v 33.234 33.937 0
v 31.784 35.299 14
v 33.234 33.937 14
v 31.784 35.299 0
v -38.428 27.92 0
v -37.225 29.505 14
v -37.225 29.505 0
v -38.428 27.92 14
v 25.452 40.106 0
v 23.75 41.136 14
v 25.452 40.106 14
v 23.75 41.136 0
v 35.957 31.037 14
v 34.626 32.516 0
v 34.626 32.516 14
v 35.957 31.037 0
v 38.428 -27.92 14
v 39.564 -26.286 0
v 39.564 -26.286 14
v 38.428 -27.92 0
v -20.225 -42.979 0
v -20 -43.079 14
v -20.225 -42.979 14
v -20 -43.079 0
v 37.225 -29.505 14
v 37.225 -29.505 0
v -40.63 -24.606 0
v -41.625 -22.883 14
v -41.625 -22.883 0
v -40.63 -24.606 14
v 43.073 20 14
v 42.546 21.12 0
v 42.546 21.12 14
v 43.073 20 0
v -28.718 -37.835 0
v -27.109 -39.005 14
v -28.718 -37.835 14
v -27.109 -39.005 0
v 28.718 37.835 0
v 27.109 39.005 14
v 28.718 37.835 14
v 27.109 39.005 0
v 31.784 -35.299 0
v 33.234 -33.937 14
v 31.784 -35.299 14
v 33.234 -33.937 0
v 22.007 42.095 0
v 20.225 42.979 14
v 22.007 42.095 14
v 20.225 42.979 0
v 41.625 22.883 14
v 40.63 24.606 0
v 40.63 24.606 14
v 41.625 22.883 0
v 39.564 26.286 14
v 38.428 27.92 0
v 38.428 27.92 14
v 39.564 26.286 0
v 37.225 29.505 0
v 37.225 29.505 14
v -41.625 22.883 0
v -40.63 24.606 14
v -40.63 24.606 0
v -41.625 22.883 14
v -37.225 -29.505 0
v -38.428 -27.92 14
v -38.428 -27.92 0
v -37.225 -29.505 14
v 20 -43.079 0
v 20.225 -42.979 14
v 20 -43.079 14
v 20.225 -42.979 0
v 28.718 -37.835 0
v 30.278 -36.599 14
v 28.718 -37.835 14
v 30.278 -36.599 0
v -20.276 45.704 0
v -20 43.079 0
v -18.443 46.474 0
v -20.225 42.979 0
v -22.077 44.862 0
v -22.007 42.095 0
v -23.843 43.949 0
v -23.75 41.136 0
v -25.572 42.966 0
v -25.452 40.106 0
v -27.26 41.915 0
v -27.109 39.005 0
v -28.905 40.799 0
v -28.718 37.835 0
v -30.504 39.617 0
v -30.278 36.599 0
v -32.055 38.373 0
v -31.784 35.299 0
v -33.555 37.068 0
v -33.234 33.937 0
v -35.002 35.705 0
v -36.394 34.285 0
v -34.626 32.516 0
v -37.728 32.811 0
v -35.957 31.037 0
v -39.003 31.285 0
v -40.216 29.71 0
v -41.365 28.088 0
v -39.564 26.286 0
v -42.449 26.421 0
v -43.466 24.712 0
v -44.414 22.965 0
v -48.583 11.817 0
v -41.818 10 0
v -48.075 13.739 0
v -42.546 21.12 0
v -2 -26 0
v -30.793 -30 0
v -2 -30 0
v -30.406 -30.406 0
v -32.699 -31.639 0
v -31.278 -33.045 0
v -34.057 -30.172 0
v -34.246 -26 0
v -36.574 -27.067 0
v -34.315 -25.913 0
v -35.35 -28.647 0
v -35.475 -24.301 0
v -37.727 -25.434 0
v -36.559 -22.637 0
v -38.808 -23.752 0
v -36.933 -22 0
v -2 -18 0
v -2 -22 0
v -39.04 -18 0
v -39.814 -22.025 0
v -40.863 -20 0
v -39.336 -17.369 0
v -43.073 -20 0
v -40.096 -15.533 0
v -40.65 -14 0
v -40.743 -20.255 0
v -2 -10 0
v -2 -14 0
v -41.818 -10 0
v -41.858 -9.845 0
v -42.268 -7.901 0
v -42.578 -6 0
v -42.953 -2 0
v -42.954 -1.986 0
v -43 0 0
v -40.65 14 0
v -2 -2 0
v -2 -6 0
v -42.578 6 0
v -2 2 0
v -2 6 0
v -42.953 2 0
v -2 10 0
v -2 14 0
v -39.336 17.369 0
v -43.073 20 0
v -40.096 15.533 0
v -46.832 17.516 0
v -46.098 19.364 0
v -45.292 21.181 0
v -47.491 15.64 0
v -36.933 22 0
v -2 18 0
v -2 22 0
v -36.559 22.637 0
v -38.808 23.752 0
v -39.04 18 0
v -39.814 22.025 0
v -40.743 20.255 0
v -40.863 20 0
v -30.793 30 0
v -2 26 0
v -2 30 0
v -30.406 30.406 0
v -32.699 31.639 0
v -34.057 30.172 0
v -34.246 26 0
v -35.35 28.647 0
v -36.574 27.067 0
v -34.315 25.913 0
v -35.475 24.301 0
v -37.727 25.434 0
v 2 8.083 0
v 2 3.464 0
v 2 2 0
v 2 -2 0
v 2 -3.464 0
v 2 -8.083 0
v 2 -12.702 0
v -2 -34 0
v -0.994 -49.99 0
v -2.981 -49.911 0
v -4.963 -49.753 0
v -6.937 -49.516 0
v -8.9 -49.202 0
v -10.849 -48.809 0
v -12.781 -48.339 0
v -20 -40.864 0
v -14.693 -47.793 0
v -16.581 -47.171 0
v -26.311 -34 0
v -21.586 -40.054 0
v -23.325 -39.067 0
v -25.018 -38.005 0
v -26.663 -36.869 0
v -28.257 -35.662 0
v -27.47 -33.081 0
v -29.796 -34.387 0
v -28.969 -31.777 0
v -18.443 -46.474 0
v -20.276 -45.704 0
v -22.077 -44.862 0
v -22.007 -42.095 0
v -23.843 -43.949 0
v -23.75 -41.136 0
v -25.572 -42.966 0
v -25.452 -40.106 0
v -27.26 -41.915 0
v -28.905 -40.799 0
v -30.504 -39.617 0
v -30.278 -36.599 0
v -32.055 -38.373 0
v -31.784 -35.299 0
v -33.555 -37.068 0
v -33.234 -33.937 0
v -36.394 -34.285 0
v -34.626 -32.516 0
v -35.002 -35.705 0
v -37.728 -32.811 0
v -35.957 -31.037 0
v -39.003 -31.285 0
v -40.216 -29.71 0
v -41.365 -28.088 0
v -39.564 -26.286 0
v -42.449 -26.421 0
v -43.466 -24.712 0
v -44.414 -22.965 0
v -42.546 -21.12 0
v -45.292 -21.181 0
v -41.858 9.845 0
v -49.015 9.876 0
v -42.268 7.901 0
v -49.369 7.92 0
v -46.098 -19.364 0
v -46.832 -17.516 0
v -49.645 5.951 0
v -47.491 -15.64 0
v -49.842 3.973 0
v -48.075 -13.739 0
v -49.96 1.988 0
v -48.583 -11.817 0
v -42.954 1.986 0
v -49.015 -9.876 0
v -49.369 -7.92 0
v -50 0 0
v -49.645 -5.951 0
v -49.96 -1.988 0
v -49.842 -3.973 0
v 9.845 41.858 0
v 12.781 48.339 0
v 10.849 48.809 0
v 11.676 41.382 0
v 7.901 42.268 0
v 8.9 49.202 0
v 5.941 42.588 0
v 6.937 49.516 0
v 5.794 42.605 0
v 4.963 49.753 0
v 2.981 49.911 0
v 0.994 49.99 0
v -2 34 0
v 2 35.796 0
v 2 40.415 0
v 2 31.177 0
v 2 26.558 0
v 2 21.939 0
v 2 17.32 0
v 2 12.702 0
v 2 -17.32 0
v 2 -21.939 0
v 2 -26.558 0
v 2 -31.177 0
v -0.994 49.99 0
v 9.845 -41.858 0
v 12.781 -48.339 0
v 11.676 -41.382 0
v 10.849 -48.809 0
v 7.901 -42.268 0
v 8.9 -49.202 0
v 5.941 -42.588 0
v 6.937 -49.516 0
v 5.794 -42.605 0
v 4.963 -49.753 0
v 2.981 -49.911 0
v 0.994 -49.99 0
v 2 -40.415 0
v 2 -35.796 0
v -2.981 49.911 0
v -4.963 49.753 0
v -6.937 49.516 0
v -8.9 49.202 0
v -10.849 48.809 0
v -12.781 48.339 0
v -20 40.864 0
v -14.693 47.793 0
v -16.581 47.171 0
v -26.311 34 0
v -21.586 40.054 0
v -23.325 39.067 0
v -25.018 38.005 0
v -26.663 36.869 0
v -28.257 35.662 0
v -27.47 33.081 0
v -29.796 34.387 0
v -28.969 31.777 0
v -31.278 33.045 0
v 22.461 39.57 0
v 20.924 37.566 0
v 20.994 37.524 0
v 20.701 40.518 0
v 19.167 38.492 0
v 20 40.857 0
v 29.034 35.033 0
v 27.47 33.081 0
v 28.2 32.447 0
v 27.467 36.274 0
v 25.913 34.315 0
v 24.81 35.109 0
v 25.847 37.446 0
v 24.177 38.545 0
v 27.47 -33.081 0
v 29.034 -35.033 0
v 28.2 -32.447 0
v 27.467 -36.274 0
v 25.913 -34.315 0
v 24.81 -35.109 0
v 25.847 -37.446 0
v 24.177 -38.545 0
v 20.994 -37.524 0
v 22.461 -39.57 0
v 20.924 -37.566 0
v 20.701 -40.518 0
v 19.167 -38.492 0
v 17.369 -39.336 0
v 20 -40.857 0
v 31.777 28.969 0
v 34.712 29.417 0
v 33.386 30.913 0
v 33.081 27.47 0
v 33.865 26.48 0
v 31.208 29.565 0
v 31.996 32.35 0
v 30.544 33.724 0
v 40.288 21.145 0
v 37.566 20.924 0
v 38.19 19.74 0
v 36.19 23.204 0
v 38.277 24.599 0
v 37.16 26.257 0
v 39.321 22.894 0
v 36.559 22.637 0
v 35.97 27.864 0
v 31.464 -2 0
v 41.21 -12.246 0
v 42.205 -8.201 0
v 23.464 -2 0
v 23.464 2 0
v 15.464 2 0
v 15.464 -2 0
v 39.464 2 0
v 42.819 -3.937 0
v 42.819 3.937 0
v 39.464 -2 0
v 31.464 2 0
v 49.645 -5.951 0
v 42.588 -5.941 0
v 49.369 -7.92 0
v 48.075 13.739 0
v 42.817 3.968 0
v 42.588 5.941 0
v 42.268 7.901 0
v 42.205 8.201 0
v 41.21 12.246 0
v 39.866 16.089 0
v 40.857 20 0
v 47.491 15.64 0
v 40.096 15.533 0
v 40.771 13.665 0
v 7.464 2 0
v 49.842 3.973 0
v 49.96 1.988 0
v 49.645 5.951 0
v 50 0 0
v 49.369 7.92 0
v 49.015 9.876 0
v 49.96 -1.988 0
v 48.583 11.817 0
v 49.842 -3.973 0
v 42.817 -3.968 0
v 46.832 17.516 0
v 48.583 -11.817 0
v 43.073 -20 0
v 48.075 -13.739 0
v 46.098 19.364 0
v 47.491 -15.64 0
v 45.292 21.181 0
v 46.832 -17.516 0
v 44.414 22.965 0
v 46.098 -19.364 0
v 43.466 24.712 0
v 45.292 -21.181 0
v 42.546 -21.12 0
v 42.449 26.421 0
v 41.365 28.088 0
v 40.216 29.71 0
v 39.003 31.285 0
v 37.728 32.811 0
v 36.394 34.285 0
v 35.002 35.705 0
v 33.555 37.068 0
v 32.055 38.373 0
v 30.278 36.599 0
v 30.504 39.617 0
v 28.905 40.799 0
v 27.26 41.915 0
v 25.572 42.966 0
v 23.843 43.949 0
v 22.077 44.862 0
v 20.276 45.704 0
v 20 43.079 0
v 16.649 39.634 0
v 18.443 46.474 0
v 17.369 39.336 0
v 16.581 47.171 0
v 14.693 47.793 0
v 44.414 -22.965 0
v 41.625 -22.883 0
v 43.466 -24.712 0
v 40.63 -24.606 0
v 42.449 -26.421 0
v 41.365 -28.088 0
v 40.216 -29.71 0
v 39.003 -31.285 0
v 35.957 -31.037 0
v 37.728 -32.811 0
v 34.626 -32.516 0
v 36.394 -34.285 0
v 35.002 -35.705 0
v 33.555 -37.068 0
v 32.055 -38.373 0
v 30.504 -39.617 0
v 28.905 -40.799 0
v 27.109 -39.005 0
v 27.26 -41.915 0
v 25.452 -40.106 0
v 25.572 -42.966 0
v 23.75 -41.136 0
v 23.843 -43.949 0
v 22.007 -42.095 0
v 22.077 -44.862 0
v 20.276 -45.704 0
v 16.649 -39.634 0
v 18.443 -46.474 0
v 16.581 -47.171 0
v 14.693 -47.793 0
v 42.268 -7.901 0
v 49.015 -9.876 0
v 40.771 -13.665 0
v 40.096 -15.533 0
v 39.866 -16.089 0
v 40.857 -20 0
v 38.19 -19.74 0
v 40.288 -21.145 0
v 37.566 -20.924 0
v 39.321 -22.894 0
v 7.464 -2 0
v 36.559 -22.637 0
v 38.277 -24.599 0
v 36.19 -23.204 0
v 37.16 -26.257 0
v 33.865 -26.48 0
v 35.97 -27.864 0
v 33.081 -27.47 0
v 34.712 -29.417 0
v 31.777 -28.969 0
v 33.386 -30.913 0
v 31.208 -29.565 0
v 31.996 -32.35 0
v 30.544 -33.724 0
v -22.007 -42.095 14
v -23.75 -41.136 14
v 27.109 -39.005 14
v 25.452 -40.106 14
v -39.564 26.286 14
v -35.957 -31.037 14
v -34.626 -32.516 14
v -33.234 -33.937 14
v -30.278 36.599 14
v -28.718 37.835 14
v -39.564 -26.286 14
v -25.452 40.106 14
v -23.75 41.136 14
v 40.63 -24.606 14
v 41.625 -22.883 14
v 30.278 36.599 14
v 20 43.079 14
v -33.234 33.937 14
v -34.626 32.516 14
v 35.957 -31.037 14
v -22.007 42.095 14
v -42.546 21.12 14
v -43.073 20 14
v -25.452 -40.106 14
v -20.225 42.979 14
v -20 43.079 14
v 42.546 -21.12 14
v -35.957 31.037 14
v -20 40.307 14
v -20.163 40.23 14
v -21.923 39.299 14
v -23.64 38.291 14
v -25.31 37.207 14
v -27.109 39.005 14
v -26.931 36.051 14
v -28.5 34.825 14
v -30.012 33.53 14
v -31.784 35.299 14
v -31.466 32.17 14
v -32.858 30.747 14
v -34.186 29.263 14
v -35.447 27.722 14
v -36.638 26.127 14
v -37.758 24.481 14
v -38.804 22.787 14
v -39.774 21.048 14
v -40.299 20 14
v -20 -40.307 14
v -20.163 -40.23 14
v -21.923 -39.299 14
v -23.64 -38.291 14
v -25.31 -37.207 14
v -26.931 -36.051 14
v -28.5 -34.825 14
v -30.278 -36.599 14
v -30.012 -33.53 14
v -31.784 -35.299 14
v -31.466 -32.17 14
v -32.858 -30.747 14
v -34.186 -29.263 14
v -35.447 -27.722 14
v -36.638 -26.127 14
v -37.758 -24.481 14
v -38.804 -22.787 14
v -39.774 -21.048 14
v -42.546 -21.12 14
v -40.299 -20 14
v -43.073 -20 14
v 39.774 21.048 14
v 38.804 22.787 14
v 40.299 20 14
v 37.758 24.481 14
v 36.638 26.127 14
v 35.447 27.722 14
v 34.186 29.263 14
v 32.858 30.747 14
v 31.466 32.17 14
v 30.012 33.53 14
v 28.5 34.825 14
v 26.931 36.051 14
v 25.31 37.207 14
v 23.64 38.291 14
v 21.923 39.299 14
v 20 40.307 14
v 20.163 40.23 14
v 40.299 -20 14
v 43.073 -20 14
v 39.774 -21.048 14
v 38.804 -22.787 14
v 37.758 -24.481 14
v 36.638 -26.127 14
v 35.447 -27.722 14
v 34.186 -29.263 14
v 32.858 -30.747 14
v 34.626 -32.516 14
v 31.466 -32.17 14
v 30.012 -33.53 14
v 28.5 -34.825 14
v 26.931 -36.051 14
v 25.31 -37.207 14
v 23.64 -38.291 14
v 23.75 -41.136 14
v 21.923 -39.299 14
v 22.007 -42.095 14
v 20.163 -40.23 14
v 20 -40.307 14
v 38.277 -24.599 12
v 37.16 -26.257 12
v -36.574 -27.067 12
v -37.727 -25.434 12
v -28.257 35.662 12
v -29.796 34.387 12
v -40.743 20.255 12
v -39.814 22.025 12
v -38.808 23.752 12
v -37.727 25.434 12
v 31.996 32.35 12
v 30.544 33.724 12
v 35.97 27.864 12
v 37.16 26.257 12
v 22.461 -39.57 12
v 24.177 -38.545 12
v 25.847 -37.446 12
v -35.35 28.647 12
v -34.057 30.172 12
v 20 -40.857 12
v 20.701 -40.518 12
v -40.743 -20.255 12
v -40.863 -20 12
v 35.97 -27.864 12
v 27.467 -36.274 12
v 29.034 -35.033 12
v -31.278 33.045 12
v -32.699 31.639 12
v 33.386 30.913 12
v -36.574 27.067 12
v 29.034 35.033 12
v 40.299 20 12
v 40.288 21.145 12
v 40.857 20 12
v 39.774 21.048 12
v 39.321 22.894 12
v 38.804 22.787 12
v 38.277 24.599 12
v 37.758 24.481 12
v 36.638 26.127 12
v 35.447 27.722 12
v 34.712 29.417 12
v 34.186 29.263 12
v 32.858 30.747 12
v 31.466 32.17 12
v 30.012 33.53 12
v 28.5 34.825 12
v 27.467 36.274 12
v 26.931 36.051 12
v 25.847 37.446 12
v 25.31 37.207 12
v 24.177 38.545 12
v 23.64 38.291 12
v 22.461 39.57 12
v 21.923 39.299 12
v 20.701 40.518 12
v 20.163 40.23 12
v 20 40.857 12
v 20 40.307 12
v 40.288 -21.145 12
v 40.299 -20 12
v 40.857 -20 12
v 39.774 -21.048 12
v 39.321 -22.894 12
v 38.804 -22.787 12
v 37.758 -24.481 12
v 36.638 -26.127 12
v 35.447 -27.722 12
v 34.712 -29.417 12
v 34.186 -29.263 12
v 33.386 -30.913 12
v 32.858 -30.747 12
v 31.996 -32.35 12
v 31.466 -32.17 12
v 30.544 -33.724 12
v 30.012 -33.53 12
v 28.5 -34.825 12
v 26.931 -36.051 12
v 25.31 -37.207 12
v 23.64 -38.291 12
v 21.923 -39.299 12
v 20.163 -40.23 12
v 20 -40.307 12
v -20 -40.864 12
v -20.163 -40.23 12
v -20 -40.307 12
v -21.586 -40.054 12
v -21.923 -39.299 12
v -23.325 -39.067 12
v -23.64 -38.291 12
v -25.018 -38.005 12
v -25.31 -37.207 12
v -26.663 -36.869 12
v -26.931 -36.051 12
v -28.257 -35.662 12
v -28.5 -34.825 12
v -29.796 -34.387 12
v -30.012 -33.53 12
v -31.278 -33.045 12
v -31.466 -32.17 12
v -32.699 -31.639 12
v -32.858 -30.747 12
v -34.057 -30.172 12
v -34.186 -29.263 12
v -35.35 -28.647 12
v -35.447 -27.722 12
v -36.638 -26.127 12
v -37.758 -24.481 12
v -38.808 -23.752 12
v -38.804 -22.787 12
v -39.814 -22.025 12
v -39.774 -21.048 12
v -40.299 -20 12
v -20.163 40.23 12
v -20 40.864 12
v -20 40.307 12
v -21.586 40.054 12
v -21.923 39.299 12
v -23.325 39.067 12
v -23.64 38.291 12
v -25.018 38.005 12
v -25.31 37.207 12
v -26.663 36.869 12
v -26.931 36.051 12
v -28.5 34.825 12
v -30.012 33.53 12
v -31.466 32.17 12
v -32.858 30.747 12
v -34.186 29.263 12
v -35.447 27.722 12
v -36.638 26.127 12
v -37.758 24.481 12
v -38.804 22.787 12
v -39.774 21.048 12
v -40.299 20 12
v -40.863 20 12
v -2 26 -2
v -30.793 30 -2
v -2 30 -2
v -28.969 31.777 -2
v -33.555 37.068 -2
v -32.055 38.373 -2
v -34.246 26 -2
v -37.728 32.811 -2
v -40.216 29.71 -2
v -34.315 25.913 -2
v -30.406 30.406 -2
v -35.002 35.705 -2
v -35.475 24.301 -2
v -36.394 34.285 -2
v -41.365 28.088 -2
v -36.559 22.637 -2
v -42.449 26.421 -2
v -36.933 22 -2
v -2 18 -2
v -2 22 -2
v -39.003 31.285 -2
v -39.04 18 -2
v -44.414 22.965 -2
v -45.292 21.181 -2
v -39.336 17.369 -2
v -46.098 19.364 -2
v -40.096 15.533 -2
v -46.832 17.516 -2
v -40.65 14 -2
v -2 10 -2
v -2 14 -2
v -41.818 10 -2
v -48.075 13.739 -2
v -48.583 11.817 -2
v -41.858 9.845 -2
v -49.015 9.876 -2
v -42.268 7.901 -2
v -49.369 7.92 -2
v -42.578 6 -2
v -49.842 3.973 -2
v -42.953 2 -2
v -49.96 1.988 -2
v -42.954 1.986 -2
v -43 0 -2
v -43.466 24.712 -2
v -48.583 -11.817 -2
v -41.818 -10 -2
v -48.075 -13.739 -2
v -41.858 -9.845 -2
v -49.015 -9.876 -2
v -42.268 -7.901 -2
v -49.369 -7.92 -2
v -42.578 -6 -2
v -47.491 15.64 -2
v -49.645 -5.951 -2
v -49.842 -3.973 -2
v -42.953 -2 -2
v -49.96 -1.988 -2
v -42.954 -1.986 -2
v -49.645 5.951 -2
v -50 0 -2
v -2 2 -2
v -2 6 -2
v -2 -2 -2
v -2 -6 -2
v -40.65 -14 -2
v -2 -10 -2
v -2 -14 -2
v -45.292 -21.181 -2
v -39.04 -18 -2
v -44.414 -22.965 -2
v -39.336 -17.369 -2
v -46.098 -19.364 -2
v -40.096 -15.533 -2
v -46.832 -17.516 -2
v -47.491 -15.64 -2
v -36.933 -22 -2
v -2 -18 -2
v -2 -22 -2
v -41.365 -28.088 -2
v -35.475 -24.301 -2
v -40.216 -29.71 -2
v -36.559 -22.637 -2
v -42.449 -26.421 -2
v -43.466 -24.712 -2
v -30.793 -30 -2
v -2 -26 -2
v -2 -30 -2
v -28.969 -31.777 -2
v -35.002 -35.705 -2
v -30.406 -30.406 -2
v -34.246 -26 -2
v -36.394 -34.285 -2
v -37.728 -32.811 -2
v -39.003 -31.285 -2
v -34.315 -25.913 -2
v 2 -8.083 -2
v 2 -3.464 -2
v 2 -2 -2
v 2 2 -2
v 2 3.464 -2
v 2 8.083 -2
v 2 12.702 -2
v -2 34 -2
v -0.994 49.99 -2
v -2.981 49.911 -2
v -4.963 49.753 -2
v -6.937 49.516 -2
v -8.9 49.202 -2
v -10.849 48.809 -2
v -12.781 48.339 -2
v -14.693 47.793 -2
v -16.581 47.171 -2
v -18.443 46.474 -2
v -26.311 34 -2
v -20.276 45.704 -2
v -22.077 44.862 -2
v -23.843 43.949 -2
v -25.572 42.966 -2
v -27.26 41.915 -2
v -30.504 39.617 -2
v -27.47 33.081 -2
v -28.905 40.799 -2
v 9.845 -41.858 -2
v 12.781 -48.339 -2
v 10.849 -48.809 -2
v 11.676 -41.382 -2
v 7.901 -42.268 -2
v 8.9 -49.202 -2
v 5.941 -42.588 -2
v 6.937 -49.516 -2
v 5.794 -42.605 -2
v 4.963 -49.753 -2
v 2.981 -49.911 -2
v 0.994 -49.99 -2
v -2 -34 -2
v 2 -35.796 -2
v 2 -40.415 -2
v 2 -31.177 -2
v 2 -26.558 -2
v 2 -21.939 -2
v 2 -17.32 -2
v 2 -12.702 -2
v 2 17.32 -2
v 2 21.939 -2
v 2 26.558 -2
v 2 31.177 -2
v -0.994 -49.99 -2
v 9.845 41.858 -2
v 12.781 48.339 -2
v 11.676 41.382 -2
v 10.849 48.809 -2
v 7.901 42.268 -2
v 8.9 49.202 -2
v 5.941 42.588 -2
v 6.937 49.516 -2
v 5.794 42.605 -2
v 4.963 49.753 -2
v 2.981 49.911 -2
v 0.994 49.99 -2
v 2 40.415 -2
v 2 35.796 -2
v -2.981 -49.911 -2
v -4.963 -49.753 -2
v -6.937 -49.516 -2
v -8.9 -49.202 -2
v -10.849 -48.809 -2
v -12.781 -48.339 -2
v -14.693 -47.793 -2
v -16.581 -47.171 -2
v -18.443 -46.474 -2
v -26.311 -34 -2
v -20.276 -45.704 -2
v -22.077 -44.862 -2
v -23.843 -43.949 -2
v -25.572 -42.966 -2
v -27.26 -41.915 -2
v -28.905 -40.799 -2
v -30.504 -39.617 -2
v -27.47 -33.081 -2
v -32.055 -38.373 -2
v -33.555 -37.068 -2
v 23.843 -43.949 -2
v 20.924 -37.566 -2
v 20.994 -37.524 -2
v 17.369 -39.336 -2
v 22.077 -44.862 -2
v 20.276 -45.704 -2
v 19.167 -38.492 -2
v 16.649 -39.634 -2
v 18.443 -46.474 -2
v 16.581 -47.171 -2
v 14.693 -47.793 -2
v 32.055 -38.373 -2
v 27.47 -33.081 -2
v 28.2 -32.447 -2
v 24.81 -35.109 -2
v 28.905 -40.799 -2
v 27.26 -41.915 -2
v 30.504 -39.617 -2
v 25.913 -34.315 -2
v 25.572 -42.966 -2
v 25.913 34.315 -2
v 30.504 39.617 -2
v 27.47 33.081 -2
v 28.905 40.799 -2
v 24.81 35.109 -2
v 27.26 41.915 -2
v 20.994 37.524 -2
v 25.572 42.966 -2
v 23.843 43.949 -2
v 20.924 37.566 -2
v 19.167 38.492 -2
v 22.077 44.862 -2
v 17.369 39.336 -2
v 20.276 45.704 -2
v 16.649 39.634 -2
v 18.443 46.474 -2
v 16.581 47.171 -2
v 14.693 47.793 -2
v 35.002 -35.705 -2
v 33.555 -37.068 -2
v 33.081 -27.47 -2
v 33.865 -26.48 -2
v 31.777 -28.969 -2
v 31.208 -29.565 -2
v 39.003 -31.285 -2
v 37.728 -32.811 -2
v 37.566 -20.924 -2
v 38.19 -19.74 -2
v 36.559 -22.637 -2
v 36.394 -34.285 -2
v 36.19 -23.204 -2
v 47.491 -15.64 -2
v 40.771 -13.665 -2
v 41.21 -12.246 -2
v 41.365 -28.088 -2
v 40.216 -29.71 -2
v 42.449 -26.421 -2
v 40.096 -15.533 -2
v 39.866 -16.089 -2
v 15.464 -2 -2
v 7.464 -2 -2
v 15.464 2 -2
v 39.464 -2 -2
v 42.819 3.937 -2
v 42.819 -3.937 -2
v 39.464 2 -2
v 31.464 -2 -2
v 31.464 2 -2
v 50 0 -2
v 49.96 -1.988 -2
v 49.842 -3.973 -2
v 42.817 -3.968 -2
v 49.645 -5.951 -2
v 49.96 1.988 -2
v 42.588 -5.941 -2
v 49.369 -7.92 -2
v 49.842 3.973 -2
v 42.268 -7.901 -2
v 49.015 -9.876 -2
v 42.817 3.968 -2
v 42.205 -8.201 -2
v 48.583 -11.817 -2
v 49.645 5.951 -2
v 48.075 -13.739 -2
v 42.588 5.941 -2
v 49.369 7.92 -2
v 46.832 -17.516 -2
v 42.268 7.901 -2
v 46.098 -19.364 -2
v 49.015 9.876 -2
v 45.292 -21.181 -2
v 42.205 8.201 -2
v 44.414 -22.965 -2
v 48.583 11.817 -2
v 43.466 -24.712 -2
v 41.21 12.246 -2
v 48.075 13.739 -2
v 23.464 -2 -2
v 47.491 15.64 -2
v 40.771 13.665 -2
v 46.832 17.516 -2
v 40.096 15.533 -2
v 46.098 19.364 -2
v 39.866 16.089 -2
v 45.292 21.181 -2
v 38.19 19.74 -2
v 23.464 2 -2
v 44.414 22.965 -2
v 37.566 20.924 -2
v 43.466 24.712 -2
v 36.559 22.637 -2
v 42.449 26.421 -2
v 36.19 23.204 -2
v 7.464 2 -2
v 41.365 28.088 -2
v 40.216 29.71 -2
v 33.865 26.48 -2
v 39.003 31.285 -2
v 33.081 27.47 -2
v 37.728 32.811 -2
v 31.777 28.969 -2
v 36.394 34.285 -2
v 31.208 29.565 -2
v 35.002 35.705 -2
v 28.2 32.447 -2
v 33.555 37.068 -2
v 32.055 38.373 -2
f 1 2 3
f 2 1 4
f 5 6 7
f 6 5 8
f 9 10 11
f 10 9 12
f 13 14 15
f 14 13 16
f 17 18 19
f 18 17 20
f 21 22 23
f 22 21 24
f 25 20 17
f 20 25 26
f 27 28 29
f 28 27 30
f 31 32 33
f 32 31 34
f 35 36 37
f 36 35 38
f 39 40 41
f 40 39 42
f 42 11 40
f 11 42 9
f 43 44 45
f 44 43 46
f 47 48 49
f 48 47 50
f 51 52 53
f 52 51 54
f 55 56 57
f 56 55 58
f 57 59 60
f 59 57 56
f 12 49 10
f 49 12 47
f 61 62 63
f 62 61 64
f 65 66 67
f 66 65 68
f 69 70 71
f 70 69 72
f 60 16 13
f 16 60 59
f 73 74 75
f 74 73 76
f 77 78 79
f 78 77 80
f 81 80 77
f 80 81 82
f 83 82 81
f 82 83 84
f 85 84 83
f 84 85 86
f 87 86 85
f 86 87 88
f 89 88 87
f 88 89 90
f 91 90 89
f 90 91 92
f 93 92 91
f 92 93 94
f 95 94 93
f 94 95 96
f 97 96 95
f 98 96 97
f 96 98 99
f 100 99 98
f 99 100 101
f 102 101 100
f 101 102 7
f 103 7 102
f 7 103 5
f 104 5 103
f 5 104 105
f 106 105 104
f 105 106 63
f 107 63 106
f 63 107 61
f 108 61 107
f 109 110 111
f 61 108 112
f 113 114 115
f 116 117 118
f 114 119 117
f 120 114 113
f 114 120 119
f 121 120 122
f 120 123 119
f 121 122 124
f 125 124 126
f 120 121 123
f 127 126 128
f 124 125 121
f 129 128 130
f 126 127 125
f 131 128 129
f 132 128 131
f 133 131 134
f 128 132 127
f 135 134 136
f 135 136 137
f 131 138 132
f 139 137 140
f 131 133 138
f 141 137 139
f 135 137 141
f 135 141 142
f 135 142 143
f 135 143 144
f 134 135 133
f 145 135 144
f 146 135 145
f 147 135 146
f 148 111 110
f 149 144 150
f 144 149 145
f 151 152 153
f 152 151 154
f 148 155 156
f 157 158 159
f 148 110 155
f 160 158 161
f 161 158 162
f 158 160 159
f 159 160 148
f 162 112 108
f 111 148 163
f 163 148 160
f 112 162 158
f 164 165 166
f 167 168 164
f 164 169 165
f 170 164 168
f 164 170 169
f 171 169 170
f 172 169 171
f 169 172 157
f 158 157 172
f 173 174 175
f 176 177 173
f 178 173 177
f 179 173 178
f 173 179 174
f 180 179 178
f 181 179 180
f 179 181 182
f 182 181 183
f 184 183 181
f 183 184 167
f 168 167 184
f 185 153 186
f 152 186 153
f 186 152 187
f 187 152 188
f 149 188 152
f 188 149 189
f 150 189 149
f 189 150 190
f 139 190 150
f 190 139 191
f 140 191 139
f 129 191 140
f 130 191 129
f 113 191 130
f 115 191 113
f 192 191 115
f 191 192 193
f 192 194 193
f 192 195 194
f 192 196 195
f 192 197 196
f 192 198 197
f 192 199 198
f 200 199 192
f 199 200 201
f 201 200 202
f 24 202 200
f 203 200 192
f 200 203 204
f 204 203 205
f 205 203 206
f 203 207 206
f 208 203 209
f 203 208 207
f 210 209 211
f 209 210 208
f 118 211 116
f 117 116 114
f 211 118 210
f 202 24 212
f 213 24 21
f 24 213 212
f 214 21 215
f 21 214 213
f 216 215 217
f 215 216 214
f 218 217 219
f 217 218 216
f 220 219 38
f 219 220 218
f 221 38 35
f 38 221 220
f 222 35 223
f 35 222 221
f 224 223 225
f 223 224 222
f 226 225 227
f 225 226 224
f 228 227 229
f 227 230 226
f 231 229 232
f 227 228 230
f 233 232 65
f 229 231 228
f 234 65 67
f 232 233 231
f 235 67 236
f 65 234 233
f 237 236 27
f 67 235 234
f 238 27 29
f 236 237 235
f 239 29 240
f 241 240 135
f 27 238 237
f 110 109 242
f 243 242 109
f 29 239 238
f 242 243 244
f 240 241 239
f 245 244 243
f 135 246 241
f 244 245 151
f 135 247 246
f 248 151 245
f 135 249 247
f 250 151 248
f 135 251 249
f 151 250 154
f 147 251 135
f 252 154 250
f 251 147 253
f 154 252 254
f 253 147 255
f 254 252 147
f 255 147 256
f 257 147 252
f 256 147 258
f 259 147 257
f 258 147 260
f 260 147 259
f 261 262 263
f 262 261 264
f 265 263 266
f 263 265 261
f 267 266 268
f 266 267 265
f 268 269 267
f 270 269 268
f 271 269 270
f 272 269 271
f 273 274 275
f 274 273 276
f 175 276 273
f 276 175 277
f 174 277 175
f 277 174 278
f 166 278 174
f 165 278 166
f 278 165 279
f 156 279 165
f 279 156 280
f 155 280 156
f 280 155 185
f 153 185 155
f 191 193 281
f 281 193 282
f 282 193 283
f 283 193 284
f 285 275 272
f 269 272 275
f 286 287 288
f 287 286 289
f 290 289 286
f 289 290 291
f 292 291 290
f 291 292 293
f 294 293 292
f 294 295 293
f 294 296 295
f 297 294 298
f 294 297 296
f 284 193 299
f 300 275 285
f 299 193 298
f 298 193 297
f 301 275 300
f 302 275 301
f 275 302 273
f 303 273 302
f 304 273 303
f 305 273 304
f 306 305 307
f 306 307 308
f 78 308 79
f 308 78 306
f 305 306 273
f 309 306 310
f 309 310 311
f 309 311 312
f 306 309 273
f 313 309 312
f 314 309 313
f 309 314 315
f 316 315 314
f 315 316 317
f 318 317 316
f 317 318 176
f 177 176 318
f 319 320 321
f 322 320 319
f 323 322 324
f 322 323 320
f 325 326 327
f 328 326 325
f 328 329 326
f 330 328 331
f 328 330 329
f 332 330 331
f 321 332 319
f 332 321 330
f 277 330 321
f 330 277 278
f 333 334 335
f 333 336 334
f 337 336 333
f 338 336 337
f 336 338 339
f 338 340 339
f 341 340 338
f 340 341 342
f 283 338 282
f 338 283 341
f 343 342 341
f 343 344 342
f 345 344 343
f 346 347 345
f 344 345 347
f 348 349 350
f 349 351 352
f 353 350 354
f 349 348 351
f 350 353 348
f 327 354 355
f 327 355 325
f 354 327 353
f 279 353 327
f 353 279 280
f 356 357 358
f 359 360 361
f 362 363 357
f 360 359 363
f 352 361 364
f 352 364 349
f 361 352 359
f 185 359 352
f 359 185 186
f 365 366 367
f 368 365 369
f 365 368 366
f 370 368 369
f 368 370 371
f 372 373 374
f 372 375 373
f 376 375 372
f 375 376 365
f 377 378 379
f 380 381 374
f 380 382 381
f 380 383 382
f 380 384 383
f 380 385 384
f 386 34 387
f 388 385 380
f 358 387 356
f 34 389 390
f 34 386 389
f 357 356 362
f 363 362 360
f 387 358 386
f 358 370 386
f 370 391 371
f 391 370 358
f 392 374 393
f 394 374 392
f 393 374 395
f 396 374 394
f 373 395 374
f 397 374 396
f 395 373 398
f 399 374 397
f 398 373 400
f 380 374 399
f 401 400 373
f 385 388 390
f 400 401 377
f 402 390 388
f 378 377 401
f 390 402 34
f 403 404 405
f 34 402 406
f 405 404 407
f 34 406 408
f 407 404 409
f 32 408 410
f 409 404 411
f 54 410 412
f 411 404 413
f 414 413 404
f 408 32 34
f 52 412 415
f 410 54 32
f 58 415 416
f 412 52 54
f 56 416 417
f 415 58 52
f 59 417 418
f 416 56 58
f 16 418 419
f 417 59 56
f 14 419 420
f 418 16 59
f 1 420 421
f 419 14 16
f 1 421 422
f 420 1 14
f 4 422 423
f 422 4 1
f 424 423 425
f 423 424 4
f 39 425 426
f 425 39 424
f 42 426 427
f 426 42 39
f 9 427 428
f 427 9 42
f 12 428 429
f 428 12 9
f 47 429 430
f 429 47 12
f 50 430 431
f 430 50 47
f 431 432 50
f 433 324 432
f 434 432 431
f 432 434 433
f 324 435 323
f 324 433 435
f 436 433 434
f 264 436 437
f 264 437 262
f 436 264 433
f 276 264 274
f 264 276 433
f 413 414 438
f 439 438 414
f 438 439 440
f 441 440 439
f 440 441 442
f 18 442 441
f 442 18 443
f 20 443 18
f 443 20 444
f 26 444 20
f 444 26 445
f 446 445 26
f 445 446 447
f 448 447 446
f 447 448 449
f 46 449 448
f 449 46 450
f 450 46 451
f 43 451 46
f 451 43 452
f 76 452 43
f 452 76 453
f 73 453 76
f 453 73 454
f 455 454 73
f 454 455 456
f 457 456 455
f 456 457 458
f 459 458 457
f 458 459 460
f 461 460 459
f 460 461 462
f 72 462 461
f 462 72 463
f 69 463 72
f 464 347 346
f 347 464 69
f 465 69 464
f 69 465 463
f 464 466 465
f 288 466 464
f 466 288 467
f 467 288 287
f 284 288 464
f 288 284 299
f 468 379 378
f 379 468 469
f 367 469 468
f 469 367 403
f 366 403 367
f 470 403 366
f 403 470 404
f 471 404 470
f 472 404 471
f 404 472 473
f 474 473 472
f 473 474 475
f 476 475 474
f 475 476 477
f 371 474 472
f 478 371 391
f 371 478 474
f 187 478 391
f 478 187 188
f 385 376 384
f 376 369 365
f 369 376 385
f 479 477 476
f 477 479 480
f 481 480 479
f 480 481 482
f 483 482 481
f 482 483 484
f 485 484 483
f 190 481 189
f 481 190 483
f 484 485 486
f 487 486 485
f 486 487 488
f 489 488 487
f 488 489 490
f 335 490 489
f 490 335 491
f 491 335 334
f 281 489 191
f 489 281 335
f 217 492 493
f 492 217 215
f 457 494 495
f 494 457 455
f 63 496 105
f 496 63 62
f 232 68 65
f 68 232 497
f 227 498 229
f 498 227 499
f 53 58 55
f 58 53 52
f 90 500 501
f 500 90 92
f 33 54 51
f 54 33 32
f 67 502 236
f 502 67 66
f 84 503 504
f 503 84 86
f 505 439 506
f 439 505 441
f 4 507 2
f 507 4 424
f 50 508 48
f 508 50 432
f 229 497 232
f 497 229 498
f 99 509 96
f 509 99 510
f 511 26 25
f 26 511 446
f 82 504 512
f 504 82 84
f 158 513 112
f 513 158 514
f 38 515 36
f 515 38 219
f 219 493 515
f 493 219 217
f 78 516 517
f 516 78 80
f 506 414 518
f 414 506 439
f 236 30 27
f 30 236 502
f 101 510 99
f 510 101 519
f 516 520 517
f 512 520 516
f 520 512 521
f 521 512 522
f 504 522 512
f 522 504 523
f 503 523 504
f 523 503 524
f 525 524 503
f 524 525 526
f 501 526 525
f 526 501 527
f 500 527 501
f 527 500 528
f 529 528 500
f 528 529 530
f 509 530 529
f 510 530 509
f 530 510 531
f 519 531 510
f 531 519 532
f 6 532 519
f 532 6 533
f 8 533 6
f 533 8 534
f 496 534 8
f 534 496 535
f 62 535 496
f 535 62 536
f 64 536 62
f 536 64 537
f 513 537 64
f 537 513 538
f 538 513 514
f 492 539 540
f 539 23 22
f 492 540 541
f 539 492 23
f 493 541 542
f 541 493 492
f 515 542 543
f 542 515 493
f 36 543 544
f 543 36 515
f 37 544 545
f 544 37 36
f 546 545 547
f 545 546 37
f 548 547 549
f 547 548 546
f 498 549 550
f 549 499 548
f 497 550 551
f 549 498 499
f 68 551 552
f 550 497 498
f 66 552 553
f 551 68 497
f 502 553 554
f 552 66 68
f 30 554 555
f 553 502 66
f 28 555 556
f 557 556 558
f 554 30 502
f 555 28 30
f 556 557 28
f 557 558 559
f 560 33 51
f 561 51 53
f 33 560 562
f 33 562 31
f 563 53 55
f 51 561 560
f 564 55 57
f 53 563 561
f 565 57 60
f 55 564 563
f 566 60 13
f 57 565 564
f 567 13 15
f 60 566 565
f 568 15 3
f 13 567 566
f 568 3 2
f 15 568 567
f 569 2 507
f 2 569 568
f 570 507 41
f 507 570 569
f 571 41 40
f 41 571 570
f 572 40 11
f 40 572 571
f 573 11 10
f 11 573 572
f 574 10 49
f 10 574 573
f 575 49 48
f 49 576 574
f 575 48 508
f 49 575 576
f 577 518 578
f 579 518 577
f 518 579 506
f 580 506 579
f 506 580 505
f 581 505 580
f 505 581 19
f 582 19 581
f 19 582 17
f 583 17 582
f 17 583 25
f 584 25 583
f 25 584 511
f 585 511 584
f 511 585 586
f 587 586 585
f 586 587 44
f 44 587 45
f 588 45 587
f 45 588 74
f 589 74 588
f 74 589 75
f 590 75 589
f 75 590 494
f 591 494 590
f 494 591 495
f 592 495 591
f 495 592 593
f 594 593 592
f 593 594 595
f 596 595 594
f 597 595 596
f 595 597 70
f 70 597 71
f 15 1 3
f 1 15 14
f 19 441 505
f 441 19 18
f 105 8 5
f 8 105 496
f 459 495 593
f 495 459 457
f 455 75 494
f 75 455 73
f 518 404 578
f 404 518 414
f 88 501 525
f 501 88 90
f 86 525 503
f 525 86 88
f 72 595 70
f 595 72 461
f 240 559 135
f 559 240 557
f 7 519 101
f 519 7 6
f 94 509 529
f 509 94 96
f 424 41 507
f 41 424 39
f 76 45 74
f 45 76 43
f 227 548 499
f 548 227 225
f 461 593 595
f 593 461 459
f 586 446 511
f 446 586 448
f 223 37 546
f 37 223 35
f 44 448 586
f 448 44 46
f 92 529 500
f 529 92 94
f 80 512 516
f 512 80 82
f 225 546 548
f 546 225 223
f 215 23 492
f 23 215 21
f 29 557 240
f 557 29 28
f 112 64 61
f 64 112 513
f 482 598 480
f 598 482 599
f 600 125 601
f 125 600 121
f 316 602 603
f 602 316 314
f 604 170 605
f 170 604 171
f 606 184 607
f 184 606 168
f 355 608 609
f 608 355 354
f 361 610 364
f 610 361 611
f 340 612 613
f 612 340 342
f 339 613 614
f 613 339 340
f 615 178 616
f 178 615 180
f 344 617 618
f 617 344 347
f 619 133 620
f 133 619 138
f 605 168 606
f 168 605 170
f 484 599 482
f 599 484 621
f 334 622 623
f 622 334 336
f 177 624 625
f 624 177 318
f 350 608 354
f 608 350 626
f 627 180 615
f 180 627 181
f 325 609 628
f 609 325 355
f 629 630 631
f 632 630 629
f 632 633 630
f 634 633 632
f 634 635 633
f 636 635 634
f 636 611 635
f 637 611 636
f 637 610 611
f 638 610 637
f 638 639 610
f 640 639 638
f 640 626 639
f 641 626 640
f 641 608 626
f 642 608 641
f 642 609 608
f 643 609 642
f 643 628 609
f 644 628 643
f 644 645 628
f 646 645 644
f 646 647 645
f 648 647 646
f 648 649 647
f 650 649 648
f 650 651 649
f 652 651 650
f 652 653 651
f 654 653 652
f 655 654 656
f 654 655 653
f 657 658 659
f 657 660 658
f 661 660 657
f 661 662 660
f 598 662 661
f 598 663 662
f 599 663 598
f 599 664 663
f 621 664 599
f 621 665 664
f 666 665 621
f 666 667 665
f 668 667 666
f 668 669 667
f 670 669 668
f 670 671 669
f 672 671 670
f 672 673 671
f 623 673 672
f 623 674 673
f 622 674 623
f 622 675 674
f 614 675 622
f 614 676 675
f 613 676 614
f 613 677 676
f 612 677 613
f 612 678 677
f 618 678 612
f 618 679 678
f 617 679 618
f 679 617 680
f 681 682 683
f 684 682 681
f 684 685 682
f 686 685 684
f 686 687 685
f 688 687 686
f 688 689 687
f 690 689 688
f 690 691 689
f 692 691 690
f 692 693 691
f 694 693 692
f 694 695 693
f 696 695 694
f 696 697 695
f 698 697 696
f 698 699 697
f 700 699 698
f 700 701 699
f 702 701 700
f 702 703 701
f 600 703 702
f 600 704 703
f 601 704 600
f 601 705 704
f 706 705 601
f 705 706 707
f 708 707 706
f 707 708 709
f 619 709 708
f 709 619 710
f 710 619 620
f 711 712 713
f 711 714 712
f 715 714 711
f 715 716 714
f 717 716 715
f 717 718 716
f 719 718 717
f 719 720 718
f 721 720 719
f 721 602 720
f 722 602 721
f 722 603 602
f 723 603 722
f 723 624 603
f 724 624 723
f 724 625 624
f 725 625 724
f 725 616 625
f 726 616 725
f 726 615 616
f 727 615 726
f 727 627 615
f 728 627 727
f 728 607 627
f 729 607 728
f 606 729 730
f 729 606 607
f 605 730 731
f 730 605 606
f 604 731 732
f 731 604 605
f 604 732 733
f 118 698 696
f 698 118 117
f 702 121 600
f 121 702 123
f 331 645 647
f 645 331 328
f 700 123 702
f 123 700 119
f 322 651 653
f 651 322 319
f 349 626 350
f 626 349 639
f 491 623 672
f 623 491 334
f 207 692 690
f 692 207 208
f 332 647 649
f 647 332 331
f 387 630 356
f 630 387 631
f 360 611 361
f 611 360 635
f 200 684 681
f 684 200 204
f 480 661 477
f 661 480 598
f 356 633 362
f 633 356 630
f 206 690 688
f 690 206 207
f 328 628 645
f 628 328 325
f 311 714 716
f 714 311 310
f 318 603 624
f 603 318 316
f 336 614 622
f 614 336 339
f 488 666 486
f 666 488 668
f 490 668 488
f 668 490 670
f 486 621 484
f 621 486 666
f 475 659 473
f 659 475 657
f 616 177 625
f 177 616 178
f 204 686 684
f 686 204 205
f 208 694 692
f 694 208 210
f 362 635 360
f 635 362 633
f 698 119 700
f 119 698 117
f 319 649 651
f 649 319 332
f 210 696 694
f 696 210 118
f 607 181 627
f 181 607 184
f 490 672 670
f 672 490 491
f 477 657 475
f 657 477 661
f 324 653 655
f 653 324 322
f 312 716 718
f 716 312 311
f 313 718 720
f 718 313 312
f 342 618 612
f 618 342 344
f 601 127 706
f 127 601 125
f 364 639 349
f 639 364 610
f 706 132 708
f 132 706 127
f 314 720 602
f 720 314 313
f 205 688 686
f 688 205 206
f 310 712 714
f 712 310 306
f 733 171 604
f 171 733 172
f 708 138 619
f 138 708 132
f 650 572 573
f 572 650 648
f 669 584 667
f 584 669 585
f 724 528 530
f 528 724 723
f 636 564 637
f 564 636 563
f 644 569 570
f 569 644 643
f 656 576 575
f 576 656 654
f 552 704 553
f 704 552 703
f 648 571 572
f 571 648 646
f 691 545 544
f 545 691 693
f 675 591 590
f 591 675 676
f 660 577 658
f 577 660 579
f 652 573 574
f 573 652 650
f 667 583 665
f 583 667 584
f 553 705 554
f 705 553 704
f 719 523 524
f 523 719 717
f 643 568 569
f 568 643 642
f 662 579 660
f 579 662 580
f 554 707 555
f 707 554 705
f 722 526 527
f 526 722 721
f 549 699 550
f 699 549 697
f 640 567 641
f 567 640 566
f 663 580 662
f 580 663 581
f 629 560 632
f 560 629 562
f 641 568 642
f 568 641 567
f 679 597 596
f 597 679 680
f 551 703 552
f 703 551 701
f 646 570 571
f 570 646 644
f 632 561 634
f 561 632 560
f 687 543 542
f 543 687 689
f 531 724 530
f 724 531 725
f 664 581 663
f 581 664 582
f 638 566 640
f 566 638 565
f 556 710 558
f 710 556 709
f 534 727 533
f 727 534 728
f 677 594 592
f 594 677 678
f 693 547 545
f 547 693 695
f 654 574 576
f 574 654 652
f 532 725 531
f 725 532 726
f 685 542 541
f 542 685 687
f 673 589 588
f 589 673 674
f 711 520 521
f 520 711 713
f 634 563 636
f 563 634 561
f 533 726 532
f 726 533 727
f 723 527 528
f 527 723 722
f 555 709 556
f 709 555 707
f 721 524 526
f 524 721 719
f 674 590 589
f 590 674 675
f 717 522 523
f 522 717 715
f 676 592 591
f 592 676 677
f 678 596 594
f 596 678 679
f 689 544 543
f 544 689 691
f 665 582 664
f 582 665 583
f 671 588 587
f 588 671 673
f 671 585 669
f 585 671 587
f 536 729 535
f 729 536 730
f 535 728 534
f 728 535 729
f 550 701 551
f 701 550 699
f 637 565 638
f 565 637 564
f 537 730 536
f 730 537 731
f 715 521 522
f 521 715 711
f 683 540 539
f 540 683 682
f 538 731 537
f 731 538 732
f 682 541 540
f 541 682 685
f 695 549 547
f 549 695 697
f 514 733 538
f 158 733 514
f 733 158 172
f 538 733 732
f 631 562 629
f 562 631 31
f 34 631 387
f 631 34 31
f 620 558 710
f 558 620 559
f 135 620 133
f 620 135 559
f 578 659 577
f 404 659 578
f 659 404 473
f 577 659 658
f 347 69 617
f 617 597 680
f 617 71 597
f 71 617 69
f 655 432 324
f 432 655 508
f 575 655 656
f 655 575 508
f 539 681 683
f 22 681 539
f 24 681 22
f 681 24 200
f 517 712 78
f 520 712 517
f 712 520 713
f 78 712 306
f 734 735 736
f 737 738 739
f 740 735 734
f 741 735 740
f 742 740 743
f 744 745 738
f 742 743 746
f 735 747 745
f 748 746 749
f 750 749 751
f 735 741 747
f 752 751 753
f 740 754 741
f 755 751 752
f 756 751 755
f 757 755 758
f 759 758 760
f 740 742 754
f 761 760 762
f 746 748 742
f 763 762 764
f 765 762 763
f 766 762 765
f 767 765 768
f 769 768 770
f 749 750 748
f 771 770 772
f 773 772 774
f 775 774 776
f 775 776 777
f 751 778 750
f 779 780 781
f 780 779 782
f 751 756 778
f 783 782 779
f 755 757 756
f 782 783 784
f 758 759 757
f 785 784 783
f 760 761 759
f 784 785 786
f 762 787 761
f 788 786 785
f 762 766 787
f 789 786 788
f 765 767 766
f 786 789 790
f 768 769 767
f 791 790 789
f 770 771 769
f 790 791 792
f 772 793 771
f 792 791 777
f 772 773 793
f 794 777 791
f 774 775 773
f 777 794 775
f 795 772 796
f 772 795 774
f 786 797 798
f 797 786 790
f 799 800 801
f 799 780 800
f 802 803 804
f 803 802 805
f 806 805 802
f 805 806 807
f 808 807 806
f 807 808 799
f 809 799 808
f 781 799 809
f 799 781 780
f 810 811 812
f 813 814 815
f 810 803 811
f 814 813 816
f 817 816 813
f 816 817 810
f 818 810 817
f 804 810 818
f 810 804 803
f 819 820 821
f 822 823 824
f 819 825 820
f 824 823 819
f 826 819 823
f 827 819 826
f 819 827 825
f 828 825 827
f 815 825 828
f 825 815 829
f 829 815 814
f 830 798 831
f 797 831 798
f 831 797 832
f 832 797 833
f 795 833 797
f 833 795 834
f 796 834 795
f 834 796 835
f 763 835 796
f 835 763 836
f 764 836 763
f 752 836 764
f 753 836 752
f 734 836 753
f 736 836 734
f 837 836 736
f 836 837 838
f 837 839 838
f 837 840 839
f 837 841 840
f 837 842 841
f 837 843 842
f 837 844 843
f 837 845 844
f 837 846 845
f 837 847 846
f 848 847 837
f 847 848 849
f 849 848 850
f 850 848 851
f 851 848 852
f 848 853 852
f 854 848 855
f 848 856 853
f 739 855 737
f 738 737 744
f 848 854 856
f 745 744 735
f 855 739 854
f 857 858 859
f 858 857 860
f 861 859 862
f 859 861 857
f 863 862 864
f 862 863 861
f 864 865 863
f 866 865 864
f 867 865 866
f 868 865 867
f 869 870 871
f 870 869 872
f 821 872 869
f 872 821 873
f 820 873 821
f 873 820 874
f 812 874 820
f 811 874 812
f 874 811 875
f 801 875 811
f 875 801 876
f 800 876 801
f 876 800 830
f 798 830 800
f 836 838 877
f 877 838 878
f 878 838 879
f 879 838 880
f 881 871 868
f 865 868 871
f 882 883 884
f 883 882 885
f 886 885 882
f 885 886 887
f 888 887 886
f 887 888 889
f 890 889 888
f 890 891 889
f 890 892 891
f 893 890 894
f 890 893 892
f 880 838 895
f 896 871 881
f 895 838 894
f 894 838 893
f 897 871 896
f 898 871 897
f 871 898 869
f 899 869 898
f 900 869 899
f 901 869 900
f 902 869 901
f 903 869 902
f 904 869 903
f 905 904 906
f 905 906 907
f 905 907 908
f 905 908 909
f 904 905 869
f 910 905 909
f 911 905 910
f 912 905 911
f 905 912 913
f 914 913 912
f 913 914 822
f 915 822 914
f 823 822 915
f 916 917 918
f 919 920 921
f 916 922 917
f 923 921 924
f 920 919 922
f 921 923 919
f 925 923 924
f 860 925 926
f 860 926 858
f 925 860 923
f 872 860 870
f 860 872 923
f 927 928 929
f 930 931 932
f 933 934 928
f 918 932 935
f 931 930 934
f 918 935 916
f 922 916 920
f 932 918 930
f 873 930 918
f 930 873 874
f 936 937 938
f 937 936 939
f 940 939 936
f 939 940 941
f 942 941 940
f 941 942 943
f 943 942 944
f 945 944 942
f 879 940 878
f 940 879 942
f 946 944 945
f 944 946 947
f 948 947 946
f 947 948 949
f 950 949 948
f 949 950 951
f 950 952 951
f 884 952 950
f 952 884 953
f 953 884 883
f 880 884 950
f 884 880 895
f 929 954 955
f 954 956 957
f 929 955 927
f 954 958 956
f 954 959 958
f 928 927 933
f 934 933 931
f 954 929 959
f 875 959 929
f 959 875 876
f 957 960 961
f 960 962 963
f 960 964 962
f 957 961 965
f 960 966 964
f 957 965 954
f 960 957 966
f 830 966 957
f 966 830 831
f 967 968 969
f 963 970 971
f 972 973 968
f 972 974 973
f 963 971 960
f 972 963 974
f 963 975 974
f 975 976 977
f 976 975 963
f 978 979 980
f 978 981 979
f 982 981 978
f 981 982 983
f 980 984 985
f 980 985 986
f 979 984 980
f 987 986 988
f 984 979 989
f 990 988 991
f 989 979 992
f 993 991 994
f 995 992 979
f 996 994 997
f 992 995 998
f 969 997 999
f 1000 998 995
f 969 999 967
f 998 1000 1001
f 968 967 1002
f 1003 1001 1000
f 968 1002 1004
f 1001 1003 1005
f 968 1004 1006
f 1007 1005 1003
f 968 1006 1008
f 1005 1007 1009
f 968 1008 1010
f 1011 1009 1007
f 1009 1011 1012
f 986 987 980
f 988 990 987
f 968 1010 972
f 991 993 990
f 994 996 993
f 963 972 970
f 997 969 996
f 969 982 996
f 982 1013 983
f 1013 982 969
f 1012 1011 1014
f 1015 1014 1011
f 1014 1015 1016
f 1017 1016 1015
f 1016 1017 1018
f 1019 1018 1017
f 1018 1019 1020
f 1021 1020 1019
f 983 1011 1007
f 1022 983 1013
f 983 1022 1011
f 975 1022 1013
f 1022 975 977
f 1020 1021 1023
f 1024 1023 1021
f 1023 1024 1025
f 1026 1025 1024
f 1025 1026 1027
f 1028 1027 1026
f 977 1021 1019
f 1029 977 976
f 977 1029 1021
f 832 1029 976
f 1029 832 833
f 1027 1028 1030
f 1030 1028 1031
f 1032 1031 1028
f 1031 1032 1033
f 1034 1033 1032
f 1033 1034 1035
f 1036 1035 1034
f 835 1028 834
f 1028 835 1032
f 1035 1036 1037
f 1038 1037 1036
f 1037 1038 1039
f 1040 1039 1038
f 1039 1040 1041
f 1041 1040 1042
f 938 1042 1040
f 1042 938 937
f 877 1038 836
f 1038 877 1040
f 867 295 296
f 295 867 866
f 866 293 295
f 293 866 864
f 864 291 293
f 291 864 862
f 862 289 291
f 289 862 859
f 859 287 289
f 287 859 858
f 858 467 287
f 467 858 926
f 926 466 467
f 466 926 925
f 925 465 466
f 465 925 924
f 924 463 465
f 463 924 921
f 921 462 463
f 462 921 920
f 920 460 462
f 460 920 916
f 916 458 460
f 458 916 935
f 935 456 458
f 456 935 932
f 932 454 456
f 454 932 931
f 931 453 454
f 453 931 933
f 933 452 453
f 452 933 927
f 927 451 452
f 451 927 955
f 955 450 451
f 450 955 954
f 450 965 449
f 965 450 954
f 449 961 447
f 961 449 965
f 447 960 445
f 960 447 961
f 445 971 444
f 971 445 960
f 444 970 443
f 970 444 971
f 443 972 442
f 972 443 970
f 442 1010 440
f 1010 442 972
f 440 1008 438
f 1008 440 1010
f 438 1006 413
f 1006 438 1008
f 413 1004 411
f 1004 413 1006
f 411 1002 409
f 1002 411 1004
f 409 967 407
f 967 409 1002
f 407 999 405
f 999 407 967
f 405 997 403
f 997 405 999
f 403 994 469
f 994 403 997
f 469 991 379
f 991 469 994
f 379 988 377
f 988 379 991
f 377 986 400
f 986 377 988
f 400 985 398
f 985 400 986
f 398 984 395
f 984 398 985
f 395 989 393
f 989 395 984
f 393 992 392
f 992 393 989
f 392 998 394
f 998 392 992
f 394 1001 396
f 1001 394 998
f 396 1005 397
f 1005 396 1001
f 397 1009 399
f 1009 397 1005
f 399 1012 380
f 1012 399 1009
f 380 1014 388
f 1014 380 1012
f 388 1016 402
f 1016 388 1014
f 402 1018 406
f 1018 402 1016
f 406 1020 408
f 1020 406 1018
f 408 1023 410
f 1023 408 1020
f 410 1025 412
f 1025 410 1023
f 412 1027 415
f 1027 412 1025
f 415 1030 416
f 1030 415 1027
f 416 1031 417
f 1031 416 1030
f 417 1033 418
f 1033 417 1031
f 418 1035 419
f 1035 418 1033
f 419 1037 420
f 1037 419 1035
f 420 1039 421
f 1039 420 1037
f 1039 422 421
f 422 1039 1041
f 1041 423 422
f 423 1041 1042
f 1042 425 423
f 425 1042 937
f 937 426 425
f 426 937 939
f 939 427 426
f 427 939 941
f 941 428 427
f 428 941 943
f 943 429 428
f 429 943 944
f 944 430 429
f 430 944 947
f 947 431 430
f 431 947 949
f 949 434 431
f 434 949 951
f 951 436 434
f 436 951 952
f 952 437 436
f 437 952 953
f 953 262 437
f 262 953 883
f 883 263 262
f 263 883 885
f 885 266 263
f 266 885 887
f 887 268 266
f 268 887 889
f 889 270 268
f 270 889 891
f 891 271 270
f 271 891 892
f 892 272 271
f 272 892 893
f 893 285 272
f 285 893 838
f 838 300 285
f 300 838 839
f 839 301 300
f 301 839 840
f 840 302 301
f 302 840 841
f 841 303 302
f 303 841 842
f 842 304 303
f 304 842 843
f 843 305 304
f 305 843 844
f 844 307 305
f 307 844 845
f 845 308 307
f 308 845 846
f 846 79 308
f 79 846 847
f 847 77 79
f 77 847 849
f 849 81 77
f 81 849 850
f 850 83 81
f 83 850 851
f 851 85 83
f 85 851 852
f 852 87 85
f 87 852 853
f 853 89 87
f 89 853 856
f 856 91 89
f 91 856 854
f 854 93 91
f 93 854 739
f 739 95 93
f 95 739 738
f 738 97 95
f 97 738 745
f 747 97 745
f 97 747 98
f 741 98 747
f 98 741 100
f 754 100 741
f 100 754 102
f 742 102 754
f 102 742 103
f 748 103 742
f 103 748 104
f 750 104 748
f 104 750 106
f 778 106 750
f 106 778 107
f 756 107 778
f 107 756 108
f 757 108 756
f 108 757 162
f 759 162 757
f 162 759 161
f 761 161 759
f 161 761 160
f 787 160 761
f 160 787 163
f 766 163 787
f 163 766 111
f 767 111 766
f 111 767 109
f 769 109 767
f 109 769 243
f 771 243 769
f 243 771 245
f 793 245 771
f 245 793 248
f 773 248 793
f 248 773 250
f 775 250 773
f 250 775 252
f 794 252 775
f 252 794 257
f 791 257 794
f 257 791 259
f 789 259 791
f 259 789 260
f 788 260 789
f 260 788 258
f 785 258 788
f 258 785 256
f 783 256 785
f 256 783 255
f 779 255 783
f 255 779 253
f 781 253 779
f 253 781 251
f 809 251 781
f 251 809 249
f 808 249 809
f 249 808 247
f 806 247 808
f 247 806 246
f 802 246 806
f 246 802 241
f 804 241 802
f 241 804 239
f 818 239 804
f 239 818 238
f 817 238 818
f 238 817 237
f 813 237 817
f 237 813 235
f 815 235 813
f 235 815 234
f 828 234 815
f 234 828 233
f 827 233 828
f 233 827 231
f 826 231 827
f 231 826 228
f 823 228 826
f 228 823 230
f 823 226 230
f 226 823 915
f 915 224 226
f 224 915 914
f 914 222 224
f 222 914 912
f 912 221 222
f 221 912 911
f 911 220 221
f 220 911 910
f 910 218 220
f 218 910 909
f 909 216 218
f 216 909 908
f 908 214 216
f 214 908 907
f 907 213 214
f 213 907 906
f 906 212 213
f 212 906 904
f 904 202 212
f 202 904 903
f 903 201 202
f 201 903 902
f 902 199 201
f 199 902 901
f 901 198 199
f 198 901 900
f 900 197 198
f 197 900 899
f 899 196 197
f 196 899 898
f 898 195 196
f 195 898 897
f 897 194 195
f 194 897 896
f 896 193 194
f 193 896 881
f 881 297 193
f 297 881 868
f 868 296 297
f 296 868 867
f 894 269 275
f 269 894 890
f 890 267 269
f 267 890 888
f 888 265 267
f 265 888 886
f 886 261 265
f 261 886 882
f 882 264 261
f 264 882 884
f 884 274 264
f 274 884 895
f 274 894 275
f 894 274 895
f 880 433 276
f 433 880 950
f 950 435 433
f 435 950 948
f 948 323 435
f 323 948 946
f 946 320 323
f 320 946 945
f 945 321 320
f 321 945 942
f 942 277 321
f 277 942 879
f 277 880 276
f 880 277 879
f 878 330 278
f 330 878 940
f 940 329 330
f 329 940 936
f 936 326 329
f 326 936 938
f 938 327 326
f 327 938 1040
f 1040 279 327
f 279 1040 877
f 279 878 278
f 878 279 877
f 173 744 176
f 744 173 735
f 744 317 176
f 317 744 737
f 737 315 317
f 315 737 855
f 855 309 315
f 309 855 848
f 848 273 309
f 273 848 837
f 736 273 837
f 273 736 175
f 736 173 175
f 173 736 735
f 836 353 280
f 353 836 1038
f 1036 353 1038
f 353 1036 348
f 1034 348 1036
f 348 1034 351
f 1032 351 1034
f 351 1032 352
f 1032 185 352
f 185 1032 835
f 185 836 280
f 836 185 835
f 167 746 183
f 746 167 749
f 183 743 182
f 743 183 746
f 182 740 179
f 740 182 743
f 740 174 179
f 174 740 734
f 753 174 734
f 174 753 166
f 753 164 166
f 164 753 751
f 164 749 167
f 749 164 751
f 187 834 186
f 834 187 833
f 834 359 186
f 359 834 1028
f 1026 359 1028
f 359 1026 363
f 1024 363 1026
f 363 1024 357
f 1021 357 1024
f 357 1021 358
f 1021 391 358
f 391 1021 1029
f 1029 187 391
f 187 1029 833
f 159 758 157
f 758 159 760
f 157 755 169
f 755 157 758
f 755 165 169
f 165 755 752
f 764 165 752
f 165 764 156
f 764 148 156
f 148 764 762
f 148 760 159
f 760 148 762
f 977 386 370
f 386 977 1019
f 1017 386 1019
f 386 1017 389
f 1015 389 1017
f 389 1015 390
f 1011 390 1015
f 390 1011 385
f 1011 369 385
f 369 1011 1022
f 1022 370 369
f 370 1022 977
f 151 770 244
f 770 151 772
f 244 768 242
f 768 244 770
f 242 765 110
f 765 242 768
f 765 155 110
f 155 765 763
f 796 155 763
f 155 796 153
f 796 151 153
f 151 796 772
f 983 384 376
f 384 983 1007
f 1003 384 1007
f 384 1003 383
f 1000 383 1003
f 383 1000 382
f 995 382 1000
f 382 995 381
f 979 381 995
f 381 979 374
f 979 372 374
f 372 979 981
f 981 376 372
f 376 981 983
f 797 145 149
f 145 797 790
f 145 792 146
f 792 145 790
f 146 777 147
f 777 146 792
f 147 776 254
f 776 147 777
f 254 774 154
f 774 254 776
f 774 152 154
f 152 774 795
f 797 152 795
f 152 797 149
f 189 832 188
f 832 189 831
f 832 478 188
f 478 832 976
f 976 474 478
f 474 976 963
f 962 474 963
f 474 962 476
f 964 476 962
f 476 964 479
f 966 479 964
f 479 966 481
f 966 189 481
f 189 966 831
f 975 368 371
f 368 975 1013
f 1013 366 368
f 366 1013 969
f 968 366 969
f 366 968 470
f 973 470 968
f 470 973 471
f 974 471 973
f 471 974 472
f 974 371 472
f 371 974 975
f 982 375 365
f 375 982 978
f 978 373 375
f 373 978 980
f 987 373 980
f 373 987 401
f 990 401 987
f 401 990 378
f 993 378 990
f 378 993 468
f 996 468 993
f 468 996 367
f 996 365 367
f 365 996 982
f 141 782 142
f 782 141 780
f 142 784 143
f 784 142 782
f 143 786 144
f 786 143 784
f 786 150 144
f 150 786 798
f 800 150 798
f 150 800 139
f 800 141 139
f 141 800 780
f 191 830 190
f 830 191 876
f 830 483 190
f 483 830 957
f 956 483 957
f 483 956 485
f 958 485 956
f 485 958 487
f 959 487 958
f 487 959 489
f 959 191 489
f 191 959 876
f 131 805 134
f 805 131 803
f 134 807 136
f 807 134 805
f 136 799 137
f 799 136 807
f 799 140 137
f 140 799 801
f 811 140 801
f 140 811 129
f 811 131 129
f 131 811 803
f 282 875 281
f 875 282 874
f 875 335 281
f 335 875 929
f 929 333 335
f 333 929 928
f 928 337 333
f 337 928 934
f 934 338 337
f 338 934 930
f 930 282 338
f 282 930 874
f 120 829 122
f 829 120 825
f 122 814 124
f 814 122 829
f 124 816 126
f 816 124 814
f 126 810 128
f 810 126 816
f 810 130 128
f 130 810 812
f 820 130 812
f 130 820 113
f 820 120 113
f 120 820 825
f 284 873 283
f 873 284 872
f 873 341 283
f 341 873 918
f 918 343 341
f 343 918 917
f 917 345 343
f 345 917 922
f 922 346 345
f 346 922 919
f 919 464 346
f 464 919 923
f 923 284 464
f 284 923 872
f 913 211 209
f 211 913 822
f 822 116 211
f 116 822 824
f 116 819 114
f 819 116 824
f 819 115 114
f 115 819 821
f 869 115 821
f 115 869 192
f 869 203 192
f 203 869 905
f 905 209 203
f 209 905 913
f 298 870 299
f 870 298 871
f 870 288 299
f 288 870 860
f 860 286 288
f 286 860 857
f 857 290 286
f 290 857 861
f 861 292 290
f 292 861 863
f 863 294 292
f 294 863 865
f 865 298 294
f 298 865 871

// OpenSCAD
$fa=0.2;
$fn=0;

/*                                                 -*- c++ -*-
 * A Bahtinov mask generator.
 * Units in mm, default values are for
 * a Celestron NexStar GPS 8.
 *
 * Copyright 2013-2014, Brent Burton
 * License: CC-BY-SA
 *
 * Updated: 2014-06-23
 */

// This is the diameter of the mask.
outerDiameter = 102; // [80:400]

// The telescope light's path diameter.
aperture = 86; // [80:400]

// Diameter of secondary mirror holder. If no secondary, set to 0.
centerHoleDiameter = 0; // [0:90]

// Width of the gaps and the bars.
gap = 4; // [4:10]

/* create a series of bars covering roughly one half of the
 * scope aperture. Located in the +X side.
 */
module bars(gap, width, num=5) {
    num = round(num);
    for (i=[-num:num]) {
        translate([width/2,i*2*gap]) square([width,gap], center=true);
    }
}

module bahtinovBars(gap,width) {
    numBars = aperture/2 / gap / 2 -1;
    // +X +Y bars
    intersection() {
        rotate([0,0,30]) bars(gap, width, numBars);
        square([outerDiameter/2, outerDiameter/2], center=false);
    }
    // +X -Y bars
    intersection() {
        rotate([0,0,-30]) bars(gap, width, numBars);
        translate([0,-outerDiameter/2]) square([outerDiameter/2, outerDiameter/2], center=false);
    }
    // -X bars
    rotate([0,0,180]) bars(gap, width, numBars);
}

module bahtinov2D() {
    width = aperture/2;
    difference() {                          // overall plate minus center hole
        union() {
            difference() {                  // trims the mask to aperture size
                circle(r=aperture/2+1);
                bahtinovBars(gap,width);
            }
            difference() {                  // makes the outer margin
                circle(r=outerDiameter/2-1);
                circle(r=aperture/2);
            }
            // Add horizontal and vertical structural bars:
            square([gap,2*(aperture/2+1)], center=true);
            translate([aperture/4,0]) square([aperture/2+1,gap], center=true);
            // Add center hole margin if needed:
            if (centerHoleDiameter > 0 && centerHoleDiameter < outerDiameter) {
                circle(r=(centerHoleDiameter+gap)/2);
            }
        }
        // subtract center hole if needed
        if (centerHoleDiameter > 0 && centerHoleDiameter < outerDiameter) {
            circle(r=centerHoleDiameter/2+1);
        }
    }
}

difference()
{
  cylinder(r=47.5,h=14);
  cylinder(r=45.5,h=12);
  cylinder(r=45,h=14);
  translate([-50,-20,0]) cube([100,40,14]);
  translate([-20,-50,0]) cube([40,100,14]);
}
translate([0,0,-2]) 
   linear_extrude(height=2) bahtinov2D();
// difference()
// { 
//   cylinder(r=51,h=2);
//    cylinder(r=43,h=2);
// }

/*
translate([0,0,-10])  
{
  difference()
  {
    translate([-52,-52,0]) cube([104,104,2]);
    cylinder(r=43,h=2);
  }
  translate([-54,-30,0]) 
    union()
    {
       cube([2,10,5]);
       translate([0,0,4]) cube([2.5,10,2]);
    }
  translate([-54,20,0]) 
    union()
    {
       cube([2,10,5]);
       translate([0,0,4]) cube([2.5,10,2]);
    }
  translate([52,-30,0])
    union()
    {
       cube([2,10,5]);
       translate([-0.5,0,4]) cube([2.5,10,2]);
    }
  translate([52,20,0])
    union()
    {
       cube([2,10,5]);
       translate([-0.5,0,4]) cube([2.5,10,2]);
    }
  translate([-30,-54,0])
    union()
    {
       cube([10,2,5]);
       translate([0,0,4]) cube([10,2.5,2]);
    }
  translate([20,-54,0])
    union()
    {
       cube([10,2,5]);
       translate([0,0,4]) cube([10,2.5,2]);
    }
  translate([-30,52,0])
    union()
    {
       cube([10,2,5]);
       translate([0,-0.5,4]) cube([10,2.5,2]);
    }
  translate([20,52,0])
    union()
    {
       cube([10,2,5]);
       translate([0,-0.5,4]) cube([10,2.5,2]);
    }
}
*/
